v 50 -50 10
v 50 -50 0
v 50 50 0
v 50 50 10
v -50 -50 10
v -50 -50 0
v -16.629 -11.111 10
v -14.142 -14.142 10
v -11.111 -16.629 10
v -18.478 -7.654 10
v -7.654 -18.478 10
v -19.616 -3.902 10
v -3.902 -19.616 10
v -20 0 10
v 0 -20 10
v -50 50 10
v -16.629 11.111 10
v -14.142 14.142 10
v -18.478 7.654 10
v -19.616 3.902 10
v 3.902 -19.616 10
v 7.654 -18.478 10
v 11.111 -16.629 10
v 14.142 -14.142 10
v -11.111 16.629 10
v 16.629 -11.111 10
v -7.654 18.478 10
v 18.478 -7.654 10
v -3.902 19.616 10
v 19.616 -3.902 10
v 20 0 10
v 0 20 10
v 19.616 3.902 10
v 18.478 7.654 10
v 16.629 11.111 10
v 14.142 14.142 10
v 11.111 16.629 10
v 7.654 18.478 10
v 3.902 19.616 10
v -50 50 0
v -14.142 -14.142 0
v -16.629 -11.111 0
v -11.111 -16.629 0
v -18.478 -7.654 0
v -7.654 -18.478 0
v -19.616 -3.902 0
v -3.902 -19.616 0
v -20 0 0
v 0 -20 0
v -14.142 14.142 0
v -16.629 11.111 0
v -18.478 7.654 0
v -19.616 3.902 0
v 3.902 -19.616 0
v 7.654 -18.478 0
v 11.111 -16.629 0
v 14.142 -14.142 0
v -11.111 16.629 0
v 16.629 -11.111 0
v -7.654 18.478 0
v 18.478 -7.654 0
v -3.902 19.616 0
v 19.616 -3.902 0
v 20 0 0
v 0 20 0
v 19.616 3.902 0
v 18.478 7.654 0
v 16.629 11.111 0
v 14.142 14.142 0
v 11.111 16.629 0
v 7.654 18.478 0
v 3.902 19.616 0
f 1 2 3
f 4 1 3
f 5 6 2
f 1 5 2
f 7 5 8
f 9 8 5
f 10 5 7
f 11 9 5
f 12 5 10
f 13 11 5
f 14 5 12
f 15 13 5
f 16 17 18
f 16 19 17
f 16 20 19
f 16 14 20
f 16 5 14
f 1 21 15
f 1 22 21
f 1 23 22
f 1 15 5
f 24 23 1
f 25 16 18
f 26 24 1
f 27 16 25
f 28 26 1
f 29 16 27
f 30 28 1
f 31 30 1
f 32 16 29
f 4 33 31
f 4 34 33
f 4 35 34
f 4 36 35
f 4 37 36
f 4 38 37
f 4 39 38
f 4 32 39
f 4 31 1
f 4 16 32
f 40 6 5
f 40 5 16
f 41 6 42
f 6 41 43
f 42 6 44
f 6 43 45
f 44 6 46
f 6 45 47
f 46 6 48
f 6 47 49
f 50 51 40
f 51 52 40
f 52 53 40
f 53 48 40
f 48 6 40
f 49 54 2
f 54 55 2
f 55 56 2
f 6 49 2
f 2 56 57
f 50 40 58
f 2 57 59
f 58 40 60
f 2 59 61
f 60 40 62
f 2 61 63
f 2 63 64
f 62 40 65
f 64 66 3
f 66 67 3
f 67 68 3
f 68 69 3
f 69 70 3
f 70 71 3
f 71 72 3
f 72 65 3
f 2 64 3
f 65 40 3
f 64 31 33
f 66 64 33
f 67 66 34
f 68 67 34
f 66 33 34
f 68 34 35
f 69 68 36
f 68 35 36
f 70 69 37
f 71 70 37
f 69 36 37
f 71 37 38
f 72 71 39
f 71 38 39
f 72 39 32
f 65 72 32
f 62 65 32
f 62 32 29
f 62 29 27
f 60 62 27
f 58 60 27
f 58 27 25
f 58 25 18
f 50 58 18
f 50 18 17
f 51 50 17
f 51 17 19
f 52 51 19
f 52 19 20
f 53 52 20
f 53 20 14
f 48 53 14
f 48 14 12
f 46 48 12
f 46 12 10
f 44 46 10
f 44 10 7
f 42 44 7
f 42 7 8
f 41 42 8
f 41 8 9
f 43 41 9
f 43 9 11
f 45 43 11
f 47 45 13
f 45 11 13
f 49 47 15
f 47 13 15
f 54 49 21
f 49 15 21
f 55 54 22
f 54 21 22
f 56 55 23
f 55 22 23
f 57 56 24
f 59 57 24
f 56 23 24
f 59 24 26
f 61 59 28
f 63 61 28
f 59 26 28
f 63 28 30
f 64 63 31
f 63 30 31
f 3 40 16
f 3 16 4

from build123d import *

# Parameters (mm, degrees)
CROQUIS1_W              = 100
CROQUIS1_H              = 100
SALIENTE_EXTRUIR1_DEPTH = 10
CORTAR_EXTRUIR1_REACH   = 73.414
CROQUIS2_R              = 20


with BuildPart() as part:
    # Croquis1 → Saliente-Extruir1 (new body)
    with BuildSketch(Plane.XY):
        Rectangle(CROQUIS1_W, CROQUIS1_H)
    extrude(amount=SALIENTE_EXTRUIR1_DEPTH)

    # Croquis2 → Cortar-Extruir1 (cut, up to next)
    with BuildSketch(Plane.XY.offset(10), mode=Mode.PRIVATE) as cortar_extruir1_sk1:
        Circle(CROQUIS2_R)
    cortar_extruir1_tool1 = extrude(cortar_extruir1_sk1.sketch, amount=-CORTAR_EXTRUIR1_REACH, mode=Mode.PRIVATE) & part.part
    add(cortar_extruir1_tool1.solids().sort_by_distance((0, 0, 10))[0], mode=Mode.SUBTRACT)


solid = part.part
